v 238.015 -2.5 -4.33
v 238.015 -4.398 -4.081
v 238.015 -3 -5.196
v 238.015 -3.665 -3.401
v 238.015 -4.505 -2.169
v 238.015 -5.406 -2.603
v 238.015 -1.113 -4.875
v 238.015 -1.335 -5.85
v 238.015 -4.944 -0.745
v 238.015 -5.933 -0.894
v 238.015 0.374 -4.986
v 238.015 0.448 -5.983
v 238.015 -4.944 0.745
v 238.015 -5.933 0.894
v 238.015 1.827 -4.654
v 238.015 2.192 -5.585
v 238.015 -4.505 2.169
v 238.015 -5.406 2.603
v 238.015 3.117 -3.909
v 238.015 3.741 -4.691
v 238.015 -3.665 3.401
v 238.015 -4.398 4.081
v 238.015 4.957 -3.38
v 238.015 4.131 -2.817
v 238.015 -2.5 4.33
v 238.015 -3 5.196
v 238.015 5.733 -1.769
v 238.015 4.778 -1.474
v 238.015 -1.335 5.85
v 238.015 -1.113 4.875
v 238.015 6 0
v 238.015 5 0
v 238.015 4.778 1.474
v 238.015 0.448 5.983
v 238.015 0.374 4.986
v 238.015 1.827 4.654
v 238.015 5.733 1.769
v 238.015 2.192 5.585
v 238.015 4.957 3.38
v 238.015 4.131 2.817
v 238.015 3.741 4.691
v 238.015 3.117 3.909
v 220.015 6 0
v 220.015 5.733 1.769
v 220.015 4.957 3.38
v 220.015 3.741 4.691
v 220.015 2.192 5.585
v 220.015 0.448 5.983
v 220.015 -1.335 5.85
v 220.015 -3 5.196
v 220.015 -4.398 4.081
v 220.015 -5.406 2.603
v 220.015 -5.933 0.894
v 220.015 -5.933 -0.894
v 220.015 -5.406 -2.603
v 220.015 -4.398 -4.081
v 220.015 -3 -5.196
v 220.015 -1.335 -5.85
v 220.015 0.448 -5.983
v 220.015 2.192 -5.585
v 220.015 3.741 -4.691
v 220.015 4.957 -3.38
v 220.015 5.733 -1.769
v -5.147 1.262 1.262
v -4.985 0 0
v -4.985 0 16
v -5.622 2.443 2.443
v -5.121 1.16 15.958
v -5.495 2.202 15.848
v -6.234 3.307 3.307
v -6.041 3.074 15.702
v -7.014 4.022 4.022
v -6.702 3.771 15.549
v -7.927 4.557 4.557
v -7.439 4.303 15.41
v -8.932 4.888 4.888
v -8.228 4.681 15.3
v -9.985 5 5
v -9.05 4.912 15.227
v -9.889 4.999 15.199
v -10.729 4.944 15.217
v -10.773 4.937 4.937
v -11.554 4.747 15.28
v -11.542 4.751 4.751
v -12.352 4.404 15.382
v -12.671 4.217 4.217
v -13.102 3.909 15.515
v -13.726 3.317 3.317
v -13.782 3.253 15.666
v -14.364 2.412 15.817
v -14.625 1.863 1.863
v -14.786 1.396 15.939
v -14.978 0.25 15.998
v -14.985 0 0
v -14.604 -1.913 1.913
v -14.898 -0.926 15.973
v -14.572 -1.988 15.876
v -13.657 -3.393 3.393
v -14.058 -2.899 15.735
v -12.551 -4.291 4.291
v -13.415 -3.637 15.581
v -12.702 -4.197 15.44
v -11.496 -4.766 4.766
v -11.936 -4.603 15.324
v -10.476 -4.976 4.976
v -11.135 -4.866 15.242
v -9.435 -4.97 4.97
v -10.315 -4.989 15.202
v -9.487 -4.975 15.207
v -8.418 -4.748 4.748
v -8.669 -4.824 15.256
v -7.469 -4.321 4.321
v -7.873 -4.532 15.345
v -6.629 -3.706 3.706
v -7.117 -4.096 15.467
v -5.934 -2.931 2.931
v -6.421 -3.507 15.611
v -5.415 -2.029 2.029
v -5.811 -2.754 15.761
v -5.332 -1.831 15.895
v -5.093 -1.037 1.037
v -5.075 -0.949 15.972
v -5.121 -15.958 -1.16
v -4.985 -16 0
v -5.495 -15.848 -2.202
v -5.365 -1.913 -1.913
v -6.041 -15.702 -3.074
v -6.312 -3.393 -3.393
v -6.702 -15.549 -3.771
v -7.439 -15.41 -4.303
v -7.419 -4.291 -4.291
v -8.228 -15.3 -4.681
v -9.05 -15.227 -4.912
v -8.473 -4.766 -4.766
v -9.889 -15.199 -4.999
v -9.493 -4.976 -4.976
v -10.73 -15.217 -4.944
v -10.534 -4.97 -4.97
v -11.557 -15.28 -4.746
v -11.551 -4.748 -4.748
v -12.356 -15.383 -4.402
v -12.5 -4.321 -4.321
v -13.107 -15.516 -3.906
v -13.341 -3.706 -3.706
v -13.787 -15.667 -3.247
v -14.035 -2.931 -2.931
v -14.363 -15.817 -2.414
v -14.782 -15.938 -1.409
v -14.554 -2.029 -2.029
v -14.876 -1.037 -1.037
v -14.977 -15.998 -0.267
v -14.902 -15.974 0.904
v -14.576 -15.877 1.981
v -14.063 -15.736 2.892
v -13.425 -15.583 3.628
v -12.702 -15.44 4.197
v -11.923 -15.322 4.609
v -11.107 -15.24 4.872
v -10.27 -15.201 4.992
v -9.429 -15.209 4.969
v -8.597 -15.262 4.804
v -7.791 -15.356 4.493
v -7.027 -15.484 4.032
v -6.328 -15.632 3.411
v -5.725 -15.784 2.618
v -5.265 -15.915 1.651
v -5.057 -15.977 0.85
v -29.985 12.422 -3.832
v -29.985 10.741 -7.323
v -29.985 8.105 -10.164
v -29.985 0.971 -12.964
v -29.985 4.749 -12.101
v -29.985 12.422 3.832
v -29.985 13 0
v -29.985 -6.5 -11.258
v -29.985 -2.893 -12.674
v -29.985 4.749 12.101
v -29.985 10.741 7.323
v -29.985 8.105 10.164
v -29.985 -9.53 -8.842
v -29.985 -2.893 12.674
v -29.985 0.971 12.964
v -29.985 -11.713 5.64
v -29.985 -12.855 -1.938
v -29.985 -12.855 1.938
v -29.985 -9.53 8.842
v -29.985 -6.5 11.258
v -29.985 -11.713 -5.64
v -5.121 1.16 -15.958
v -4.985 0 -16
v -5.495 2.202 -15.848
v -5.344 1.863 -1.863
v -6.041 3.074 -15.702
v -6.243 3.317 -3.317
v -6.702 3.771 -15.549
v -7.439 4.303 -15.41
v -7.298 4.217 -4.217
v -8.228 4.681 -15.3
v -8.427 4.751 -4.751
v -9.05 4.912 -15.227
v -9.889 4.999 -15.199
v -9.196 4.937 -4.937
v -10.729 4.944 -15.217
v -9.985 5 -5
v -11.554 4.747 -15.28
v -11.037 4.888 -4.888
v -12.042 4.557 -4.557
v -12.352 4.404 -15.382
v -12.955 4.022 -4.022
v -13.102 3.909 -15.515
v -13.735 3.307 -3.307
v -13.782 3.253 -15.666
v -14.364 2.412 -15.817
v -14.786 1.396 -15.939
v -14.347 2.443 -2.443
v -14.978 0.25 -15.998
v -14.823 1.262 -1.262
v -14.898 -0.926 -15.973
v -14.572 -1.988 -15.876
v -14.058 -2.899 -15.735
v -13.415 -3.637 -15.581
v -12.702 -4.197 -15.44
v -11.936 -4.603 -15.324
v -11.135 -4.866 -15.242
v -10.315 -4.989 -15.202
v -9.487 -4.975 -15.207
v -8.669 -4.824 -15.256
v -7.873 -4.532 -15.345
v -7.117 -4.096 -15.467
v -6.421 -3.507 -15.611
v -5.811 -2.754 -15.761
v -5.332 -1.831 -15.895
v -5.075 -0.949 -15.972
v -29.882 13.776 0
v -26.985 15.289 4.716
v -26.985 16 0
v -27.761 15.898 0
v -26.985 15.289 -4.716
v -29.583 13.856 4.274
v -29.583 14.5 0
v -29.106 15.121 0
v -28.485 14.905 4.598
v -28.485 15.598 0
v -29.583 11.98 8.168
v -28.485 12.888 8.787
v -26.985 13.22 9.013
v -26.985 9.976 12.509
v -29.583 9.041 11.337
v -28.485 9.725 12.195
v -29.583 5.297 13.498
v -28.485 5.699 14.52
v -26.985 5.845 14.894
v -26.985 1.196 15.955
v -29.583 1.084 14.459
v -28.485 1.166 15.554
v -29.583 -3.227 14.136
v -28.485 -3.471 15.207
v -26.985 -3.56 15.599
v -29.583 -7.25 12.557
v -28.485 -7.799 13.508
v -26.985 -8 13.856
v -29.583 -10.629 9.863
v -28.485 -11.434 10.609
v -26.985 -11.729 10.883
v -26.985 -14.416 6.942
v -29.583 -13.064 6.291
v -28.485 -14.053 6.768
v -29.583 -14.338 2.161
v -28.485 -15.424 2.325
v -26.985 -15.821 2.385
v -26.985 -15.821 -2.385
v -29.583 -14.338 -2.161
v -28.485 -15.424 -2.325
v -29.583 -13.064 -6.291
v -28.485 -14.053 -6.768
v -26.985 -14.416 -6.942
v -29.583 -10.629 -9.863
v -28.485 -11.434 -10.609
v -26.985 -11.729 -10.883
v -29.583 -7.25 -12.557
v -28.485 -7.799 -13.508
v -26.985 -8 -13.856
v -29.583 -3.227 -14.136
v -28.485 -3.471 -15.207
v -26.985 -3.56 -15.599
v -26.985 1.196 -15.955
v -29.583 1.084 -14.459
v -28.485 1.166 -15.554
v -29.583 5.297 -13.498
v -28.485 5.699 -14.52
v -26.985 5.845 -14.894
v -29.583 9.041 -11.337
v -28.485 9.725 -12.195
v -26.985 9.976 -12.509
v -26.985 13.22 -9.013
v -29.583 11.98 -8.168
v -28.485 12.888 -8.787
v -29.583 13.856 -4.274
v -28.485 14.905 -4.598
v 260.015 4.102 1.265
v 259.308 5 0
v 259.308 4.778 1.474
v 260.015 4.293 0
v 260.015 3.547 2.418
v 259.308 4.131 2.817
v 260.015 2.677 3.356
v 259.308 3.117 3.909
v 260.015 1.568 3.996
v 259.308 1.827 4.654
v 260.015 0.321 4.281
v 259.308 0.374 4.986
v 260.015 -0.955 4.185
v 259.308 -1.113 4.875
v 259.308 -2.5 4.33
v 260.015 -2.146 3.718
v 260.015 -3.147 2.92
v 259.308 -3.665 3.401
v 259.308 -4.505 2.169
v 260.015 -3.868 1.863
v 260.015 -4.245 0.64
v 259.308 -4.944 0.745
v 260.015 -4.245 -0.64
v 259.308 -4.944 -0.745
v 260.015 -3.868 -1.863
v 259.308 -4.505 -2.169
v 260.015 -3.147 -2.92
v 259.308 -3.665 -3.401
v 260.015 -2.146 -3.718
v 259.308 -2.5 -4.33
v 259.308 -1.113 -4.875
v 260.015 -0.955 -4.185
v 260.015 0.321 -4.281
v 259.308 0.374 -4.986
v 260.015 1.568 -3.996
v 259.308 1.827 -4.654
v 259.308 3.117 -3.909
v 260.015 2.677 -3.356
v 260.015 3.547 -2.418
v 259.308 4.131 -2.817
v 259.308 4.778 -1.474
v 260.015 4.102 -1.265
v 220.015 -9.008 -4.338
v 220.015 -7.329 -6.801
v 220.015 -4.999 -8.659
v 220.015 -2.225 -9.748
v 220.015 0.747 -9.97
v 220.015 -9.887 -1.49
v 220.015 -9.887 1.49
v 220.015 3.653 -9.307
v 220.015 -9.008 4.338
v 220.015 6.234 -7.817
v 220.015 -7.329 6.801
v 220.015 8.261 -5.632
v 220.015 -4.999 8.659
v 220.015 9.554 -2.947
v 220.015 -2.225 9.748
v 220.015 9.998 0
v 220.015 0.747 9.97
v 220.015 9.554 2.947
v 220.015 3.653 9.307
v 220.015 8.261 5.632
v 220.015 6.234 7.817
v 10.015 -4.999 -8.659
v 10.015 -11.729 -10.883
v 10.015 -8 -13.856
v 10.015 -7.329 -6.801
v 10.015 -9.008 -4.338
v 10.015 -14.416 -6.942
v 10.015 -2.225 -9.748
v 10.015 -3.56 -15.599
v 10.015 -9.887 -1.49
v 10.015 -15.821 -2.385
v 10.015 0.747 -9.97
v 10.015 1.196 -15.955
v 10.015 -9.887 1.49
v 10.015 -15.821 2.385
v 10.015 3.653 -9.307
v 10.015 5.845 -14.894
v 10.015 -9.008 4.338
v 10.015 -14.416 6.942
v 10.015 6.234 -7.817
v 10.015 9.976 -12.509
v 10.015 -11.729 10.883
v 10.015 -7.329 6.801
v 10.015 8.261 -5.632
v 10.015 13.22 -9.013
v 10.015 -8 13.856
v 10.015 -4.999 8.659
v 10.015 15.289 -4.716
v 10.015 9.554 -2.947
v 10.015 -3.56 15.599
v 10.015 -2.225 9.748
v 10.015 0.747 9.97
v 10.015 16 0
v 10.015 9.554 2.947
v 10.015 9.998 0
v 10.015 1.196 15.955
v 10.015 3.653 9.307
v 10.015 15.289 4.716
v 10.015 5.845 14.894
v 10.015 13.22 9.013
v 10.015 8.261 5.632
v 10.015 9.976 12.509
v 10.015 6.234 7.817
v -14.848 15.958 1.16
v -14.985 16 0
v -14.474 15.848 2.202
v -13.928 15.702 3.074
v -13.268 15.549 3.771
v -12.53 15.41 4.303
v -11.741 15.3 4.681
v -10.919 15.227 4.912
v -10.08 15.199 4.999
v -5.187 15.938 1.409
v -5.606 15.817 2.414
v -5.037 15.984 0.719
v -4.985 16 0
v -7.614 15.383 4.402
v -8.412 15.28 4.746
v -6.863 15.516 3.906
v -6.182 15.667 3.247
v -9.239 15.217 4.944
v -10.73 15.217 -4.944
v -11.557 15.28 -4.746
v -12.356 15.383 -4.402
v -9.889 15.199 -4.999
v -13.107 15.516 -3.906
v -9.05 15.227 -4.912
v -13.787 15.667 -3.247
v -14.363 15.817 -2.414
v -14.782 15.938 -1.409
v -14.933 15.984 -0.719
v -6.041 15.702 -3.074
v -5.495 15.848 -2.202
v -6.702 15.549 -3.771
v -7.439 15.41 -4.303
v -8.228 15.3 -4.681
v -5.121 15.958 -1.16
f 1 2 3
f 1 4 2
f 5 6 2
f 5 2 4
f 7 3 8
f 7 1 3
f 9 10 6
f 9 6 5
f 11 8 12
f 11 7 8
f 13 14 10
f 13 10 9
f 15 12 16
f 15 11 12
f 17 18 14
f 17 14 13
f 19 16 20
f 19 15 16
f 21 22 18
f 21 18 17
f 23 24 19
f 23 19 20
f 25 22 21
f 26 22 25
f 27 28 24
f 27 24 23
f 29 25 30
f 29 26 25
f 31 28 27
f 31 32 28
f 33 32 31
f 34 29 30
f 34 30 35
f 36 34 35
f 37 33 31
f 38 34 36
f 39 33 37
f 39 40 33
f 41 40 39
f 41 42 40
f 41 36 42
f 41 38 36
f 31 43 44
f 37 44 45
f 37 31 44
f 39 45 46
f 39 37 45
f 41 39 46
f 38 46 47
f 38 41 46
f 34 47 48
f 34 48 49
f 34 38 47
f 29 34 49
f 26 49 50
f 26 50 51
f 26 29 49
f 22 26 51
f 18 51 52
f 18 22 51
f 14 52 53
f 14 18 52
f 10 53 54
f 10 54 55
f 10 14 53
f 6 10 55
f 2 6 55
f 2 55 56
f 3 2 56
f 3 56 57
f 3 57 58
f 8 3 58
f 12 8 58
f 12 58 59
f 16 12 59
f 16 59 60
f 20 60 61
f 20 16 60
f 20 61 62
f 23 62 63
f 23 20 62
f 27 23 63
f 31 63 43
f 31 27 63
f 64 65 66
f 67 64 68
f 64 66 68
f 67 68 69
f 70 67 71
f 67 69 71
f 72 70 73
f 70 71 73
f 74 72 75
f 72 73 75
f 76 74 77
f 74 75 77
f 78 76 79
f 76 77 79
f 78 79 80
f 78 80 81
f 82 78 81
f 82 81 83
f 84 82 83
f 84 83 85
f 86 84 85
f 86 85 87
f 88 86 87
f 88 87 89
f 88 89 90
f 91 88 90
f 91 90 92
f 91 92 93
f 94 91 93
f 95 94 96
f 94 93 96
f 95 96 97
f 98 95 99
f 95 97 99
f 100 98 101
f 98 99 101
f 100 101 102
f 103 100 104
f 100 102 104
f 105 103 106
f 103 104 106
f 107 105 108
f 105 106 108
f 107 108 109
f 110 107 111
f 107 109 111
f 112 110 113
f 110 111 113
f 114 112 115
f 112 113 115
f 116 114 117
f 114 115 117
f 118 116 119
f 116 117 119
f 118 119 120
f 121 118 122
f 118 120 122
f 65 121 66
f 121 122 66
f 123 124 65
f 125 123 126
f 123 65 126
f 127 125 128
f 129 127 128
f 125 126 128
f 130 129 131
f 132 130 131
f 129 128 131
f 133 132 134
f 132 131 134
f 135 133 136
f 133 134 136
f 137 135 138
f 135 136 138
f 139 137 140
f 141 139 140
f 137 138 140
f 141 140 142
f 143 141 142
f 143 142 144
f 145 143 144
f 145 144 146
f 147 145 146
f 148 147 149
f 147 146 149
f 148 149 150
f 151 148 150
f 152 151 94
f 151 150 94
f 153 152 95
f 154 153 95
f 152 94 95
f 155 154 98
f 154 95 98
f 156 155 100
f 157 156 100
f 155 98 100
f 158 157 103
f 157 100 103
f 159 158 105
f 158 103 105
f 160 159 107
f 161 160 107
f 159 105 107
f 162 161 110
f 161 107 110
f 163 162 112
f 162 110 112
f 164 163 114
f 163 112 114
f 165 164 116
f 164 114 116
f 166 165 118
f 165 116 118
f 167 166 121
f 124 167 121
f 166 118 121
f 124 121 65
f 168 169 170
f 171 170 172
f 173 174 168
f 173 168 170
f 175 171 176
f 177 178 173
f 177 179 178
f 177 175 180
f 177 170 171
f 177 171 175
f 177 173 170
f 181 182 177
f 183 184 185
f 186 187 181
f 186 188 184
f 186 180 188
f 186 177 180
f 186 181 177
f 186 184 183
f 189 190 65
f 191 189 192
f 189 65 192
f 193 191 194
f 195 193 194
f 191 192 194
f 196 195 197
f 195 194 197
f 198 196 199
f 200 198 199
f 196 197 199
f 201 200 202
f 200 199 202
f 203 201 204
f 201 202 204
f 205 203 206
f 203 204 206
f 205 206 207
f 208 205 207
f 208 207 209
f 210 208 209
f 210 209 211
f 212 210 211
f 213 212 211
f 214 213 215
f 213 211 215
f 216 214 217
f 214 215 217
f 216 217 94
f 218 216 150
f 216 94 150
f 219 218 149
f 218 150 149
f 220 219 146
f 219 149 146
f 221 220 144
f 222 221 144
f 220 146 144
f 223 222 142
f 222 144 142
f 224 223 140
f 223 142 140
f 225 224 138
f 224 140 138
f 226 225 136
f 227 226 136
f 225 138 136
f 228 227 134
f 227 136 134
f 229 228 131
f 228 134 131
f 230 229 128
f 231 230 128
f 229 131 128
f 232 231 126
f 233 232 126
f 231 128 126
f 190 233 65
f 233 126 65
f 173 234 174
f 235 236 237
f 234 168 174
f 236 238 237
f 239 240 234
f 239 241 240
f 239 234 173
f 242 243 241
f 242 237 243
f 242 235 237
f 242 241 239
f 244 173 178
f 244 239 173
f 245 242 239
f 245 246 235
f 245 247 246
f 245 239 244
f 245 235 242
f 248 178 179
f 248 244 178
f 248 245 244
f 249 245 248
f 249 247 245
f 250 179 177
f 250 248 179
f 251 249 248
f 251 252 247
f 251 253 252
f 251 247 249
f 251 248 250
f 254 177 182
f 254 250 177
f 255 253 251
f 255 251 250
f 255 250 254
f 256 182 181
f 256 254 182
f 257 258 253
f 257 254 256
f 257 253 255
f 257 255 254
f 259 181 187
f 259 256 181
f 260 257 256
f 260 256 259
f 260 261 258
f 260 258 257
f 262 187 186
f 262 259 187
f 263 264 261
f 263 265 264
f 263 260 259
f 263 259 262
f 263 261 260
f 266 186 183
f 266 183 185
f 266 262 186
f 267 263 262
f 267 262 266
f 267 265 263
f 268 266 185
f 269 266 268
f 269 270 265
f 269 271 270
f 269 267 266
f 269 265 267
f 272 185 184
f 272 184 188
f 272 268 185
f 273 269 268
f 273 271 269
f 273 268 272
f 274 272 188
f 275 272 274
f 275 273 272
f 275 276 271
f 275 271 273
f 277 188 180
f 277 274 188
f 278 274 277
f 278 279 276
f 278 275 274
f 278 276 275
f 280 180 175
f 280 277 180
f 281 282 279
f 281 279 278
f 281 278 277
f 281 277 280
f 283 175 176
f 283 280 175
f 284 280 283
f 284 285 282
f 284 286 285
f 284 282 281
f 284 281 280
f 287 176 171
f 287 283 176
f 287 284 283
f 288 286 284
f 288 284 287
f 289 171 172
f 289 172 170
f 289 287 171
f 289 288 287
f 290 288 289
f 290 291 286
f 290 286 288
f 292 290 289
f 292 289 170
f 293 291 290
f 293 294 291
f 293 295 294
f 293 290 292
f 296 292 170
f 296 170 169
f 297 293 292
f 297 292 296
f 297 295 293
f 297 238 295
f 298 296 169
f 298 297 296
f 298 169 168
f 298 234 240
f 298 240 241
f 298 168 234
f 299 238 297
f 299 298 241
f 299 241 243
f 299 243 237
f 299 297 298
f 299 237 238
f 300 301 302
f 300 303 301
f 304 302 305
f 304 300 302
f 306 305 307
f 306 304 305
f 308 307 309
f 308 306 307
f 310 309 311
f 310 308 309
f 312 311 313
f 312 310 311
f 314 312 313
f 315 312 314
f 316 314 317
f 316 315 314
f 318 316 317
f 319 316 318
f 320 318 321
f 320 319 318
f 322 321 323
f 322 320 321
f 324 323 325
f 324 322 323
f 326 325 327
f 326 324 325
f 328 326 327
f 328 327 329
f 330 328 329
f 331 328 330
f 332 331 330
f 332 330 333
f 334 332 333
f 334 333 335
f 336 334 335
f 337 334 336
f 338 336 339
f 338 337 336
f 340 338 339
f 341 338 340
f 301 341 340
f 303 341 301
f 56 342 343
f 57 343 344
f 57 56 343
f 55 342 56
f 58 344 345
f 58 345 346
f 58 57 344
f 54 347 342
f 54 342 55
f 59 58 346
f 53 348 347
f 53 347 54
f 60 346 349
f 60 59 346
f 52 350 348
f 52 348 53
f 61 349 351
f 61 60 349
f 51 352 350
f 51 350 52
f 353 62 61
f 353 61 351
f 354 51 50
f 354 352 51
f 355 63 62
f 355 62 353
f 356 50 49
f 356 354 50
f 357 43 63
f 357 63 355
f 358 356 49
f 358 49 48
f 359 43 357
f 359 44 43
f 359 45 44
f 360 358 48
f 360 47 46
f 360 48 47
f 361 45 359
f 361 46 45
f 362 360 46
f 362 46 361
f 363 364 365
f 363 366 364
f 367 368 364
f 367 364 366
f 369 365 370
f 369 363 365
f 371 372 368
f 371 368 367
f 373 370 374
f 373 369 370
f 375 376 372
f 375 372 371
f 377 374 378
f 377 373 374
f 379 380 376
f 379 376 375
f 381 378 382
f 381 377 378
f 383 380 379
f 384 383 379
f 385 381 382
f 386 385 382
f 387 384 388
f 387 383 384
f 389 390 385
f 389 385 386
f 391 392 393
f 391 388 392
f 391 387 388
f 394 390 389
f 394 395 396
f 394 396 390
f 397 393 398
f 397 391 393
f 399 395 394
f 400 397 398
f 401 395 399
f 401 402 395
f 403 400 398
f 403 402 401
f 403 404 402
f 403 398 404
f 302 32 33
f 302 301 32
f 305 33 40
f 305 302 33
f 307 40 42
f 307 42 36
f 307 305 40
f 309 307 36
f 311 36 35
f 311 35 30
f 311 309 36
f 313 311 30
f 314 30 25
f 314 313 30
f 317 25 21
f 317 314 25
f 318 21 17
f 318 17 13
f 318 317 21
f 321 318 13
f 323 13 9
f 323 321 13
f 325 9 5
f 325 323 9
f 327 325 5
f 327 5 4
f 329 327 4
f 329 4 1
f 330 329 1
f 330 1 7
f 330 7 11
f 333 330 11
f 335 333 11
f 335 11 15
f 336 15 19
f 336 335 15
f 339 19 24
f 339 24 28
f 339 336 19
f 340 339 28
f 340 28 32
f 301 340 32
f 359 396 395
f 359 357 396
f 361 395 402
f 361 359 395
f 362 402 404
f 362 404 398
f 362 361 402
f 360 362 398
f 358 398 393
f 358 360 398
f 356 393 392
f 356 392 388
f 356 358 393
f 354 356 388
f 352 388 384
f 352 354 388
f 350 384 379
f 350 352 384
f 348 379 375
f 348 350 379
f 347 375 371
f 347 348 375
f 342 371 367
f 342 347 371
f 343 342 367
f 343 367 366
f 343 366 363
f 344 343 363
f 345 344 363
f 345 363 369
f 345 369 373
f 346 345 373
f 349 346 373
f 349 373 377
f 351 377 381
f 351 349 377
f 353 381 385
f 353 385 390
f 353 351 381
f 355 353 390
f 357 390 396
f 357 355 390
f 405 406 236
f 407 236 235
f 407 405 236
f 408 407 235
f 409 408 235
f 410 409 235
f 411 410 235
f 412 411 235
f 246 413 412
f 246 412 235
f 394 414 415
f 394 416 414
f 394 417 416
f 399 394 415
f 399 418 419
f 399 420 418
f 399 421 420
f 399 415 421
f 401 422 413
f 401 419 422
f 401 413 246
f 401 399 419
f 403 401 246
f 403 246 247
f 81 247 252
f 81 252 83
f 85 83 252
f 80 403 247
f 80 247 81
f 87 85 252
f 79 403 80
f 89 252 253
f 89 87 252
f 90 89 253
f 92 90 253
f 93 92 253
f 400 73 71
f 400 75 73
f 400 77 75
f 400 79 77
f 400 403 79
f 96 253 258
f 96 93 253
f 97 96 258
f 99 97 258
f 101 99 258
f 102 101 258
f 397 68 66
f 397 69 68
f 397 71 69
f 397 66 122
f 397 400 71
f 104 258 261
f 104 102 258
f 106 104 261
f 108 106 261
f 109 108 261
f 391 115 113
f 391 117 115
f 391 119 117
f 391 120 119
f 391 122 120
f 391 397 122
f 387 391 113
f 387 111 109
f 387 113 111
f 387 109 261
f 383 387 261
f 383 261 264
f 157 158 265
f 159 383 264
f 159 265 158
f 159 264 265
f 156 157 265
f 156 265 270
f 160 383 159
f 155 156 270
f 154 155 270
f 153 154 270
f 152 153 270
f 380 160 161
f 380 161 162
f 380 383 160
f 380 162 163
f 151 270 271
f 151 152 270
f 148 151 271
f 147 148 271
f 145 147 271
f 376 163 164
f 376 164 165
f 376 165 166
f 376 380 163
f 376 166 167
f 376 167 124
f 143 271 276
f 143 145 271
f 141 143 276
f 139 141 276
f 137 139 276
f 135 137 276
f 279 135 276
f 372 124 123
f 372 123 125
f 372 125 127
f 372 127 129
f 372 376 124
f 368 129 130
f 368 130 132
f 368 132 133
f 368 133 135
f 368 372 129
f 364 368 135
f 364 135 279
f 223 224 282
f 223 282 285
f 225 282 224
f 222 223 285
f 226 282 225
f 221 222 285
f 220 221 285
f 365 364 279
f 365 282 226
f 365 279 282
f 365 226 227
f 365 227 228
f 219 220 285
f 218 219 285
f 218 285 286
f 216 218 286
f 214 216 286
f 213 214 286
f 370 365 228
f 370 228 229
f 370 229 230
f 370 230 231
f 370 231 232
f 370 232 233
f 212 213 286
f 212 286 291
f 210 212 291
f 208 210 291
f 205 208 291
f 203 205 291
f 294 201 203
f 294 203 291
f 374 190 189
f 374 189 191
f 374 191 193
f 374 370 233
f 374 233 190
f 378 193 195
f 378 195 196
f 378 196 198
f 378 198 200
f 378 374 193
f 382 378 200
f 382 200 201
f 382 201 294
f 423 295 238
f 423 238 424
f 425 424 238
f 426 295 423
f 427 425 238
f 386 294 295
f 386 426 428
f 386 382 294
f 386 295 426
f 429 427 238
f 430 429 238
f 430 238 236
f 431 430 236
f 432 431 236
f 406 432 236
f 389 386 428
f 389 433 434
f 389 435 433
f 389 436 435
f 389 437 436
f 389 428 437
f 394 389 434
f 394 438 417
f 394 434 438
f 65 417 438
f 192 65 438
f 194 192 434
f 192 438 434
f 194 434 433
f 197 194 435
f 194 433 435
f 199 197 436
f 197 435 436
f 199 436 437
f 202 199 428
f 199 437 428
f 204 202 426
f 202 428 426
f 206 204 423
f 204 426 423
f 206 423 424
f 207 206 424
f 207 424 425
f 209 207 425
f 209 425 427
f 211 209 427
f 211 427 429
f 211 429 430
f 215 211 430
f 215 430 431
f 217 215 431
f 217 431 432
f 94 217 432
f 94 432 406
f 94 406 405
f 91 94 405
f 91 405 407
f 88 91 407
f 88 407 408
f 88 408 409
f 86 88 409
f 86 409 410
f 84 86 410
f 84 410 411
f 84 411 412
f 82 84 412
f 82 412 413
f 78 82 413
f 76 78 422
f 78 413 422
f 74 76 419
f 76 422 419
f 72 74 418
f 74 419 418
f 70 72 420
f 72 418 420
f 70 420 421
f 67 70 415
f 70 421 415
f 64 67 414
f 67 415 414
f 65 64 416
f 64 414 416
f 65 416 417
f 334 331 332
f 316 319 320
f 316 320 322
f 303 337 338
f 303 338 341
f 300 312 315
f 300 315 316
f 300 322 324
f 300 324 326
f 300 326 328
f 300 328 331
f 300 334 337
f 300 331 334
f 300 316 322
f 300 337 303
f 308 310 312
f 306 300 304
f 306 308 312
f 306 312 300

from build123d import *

# Parameters (mm, degrees)
SKETCH2_R          = 5
CUT_EXTRUDE1_DEPTH = 50
SKETCH3_R          = 5
CUT_EXTRUDE2_DEPTH = 50


with BuildPart() as part:
    # Sketch1 → Revolve1 (revolve)
    with BuildSketch(Plane.XY):
        with BuildLine():
            Line((238.015458409, 6), (238.015458409, 5))
            Line((238.015458409, 5), (259.308351628, 5))
            Line((259.308351628, 5), (260.015458409, 4.292893219))
            Line((260.015458409, 4.292893219), (260.015458409, 0))
            Line((260.015458409, 0), (-29.984541591, 0))
            Line((-29.984541591, 0), (-29.984541591, 13))
            ThreePointArc((-29.984541591, 13), (-29.105861935, 15.121320344), (-26.984541591, 16))
            Line((-26.984541591, 16), (10.015458409, 16))
            Line((10.015458409, 16), (10.015458409, 9.998359118))
            Line((10.015458409, 9.998359118), (220.015458409, 9.998359118))
            Line((220.015458409, 9.998359118), (220.015458409, 6))
            Line((220.015458409, 6), (238.015458409, 6))
        make_face()
    revolve(axis=Axis((-31.94536444, 0, 0), (1, 0, 0)))

    # Sketch2 → Cut-Extrude1 (cut, symmetric)
    with BuildSketch(Plane(origin=(0, 0, 0), x_dir=(1, 0, 0), z_dir=(0, 1, 0))):
        with Locations((-9.984541591, 0)):
            Circle(SKETCH2_R)
    extrude(amount=CUT_EXTRUDE1_DEPTH, both=True, mode=Mode.SUBTRACT)

    # Sketch3 → Cut-Extrude2 (cut, symmetric)
    with BuildSketch(Plane.XY):
        with Locations((-9.984541591, 0)):
            Circle(SKETCH3_R)
    extrude(amount=CUT_EXTRUDE2_DEPTH, both=True, mode=Mode.SUBTRACT)


solid = part.part
